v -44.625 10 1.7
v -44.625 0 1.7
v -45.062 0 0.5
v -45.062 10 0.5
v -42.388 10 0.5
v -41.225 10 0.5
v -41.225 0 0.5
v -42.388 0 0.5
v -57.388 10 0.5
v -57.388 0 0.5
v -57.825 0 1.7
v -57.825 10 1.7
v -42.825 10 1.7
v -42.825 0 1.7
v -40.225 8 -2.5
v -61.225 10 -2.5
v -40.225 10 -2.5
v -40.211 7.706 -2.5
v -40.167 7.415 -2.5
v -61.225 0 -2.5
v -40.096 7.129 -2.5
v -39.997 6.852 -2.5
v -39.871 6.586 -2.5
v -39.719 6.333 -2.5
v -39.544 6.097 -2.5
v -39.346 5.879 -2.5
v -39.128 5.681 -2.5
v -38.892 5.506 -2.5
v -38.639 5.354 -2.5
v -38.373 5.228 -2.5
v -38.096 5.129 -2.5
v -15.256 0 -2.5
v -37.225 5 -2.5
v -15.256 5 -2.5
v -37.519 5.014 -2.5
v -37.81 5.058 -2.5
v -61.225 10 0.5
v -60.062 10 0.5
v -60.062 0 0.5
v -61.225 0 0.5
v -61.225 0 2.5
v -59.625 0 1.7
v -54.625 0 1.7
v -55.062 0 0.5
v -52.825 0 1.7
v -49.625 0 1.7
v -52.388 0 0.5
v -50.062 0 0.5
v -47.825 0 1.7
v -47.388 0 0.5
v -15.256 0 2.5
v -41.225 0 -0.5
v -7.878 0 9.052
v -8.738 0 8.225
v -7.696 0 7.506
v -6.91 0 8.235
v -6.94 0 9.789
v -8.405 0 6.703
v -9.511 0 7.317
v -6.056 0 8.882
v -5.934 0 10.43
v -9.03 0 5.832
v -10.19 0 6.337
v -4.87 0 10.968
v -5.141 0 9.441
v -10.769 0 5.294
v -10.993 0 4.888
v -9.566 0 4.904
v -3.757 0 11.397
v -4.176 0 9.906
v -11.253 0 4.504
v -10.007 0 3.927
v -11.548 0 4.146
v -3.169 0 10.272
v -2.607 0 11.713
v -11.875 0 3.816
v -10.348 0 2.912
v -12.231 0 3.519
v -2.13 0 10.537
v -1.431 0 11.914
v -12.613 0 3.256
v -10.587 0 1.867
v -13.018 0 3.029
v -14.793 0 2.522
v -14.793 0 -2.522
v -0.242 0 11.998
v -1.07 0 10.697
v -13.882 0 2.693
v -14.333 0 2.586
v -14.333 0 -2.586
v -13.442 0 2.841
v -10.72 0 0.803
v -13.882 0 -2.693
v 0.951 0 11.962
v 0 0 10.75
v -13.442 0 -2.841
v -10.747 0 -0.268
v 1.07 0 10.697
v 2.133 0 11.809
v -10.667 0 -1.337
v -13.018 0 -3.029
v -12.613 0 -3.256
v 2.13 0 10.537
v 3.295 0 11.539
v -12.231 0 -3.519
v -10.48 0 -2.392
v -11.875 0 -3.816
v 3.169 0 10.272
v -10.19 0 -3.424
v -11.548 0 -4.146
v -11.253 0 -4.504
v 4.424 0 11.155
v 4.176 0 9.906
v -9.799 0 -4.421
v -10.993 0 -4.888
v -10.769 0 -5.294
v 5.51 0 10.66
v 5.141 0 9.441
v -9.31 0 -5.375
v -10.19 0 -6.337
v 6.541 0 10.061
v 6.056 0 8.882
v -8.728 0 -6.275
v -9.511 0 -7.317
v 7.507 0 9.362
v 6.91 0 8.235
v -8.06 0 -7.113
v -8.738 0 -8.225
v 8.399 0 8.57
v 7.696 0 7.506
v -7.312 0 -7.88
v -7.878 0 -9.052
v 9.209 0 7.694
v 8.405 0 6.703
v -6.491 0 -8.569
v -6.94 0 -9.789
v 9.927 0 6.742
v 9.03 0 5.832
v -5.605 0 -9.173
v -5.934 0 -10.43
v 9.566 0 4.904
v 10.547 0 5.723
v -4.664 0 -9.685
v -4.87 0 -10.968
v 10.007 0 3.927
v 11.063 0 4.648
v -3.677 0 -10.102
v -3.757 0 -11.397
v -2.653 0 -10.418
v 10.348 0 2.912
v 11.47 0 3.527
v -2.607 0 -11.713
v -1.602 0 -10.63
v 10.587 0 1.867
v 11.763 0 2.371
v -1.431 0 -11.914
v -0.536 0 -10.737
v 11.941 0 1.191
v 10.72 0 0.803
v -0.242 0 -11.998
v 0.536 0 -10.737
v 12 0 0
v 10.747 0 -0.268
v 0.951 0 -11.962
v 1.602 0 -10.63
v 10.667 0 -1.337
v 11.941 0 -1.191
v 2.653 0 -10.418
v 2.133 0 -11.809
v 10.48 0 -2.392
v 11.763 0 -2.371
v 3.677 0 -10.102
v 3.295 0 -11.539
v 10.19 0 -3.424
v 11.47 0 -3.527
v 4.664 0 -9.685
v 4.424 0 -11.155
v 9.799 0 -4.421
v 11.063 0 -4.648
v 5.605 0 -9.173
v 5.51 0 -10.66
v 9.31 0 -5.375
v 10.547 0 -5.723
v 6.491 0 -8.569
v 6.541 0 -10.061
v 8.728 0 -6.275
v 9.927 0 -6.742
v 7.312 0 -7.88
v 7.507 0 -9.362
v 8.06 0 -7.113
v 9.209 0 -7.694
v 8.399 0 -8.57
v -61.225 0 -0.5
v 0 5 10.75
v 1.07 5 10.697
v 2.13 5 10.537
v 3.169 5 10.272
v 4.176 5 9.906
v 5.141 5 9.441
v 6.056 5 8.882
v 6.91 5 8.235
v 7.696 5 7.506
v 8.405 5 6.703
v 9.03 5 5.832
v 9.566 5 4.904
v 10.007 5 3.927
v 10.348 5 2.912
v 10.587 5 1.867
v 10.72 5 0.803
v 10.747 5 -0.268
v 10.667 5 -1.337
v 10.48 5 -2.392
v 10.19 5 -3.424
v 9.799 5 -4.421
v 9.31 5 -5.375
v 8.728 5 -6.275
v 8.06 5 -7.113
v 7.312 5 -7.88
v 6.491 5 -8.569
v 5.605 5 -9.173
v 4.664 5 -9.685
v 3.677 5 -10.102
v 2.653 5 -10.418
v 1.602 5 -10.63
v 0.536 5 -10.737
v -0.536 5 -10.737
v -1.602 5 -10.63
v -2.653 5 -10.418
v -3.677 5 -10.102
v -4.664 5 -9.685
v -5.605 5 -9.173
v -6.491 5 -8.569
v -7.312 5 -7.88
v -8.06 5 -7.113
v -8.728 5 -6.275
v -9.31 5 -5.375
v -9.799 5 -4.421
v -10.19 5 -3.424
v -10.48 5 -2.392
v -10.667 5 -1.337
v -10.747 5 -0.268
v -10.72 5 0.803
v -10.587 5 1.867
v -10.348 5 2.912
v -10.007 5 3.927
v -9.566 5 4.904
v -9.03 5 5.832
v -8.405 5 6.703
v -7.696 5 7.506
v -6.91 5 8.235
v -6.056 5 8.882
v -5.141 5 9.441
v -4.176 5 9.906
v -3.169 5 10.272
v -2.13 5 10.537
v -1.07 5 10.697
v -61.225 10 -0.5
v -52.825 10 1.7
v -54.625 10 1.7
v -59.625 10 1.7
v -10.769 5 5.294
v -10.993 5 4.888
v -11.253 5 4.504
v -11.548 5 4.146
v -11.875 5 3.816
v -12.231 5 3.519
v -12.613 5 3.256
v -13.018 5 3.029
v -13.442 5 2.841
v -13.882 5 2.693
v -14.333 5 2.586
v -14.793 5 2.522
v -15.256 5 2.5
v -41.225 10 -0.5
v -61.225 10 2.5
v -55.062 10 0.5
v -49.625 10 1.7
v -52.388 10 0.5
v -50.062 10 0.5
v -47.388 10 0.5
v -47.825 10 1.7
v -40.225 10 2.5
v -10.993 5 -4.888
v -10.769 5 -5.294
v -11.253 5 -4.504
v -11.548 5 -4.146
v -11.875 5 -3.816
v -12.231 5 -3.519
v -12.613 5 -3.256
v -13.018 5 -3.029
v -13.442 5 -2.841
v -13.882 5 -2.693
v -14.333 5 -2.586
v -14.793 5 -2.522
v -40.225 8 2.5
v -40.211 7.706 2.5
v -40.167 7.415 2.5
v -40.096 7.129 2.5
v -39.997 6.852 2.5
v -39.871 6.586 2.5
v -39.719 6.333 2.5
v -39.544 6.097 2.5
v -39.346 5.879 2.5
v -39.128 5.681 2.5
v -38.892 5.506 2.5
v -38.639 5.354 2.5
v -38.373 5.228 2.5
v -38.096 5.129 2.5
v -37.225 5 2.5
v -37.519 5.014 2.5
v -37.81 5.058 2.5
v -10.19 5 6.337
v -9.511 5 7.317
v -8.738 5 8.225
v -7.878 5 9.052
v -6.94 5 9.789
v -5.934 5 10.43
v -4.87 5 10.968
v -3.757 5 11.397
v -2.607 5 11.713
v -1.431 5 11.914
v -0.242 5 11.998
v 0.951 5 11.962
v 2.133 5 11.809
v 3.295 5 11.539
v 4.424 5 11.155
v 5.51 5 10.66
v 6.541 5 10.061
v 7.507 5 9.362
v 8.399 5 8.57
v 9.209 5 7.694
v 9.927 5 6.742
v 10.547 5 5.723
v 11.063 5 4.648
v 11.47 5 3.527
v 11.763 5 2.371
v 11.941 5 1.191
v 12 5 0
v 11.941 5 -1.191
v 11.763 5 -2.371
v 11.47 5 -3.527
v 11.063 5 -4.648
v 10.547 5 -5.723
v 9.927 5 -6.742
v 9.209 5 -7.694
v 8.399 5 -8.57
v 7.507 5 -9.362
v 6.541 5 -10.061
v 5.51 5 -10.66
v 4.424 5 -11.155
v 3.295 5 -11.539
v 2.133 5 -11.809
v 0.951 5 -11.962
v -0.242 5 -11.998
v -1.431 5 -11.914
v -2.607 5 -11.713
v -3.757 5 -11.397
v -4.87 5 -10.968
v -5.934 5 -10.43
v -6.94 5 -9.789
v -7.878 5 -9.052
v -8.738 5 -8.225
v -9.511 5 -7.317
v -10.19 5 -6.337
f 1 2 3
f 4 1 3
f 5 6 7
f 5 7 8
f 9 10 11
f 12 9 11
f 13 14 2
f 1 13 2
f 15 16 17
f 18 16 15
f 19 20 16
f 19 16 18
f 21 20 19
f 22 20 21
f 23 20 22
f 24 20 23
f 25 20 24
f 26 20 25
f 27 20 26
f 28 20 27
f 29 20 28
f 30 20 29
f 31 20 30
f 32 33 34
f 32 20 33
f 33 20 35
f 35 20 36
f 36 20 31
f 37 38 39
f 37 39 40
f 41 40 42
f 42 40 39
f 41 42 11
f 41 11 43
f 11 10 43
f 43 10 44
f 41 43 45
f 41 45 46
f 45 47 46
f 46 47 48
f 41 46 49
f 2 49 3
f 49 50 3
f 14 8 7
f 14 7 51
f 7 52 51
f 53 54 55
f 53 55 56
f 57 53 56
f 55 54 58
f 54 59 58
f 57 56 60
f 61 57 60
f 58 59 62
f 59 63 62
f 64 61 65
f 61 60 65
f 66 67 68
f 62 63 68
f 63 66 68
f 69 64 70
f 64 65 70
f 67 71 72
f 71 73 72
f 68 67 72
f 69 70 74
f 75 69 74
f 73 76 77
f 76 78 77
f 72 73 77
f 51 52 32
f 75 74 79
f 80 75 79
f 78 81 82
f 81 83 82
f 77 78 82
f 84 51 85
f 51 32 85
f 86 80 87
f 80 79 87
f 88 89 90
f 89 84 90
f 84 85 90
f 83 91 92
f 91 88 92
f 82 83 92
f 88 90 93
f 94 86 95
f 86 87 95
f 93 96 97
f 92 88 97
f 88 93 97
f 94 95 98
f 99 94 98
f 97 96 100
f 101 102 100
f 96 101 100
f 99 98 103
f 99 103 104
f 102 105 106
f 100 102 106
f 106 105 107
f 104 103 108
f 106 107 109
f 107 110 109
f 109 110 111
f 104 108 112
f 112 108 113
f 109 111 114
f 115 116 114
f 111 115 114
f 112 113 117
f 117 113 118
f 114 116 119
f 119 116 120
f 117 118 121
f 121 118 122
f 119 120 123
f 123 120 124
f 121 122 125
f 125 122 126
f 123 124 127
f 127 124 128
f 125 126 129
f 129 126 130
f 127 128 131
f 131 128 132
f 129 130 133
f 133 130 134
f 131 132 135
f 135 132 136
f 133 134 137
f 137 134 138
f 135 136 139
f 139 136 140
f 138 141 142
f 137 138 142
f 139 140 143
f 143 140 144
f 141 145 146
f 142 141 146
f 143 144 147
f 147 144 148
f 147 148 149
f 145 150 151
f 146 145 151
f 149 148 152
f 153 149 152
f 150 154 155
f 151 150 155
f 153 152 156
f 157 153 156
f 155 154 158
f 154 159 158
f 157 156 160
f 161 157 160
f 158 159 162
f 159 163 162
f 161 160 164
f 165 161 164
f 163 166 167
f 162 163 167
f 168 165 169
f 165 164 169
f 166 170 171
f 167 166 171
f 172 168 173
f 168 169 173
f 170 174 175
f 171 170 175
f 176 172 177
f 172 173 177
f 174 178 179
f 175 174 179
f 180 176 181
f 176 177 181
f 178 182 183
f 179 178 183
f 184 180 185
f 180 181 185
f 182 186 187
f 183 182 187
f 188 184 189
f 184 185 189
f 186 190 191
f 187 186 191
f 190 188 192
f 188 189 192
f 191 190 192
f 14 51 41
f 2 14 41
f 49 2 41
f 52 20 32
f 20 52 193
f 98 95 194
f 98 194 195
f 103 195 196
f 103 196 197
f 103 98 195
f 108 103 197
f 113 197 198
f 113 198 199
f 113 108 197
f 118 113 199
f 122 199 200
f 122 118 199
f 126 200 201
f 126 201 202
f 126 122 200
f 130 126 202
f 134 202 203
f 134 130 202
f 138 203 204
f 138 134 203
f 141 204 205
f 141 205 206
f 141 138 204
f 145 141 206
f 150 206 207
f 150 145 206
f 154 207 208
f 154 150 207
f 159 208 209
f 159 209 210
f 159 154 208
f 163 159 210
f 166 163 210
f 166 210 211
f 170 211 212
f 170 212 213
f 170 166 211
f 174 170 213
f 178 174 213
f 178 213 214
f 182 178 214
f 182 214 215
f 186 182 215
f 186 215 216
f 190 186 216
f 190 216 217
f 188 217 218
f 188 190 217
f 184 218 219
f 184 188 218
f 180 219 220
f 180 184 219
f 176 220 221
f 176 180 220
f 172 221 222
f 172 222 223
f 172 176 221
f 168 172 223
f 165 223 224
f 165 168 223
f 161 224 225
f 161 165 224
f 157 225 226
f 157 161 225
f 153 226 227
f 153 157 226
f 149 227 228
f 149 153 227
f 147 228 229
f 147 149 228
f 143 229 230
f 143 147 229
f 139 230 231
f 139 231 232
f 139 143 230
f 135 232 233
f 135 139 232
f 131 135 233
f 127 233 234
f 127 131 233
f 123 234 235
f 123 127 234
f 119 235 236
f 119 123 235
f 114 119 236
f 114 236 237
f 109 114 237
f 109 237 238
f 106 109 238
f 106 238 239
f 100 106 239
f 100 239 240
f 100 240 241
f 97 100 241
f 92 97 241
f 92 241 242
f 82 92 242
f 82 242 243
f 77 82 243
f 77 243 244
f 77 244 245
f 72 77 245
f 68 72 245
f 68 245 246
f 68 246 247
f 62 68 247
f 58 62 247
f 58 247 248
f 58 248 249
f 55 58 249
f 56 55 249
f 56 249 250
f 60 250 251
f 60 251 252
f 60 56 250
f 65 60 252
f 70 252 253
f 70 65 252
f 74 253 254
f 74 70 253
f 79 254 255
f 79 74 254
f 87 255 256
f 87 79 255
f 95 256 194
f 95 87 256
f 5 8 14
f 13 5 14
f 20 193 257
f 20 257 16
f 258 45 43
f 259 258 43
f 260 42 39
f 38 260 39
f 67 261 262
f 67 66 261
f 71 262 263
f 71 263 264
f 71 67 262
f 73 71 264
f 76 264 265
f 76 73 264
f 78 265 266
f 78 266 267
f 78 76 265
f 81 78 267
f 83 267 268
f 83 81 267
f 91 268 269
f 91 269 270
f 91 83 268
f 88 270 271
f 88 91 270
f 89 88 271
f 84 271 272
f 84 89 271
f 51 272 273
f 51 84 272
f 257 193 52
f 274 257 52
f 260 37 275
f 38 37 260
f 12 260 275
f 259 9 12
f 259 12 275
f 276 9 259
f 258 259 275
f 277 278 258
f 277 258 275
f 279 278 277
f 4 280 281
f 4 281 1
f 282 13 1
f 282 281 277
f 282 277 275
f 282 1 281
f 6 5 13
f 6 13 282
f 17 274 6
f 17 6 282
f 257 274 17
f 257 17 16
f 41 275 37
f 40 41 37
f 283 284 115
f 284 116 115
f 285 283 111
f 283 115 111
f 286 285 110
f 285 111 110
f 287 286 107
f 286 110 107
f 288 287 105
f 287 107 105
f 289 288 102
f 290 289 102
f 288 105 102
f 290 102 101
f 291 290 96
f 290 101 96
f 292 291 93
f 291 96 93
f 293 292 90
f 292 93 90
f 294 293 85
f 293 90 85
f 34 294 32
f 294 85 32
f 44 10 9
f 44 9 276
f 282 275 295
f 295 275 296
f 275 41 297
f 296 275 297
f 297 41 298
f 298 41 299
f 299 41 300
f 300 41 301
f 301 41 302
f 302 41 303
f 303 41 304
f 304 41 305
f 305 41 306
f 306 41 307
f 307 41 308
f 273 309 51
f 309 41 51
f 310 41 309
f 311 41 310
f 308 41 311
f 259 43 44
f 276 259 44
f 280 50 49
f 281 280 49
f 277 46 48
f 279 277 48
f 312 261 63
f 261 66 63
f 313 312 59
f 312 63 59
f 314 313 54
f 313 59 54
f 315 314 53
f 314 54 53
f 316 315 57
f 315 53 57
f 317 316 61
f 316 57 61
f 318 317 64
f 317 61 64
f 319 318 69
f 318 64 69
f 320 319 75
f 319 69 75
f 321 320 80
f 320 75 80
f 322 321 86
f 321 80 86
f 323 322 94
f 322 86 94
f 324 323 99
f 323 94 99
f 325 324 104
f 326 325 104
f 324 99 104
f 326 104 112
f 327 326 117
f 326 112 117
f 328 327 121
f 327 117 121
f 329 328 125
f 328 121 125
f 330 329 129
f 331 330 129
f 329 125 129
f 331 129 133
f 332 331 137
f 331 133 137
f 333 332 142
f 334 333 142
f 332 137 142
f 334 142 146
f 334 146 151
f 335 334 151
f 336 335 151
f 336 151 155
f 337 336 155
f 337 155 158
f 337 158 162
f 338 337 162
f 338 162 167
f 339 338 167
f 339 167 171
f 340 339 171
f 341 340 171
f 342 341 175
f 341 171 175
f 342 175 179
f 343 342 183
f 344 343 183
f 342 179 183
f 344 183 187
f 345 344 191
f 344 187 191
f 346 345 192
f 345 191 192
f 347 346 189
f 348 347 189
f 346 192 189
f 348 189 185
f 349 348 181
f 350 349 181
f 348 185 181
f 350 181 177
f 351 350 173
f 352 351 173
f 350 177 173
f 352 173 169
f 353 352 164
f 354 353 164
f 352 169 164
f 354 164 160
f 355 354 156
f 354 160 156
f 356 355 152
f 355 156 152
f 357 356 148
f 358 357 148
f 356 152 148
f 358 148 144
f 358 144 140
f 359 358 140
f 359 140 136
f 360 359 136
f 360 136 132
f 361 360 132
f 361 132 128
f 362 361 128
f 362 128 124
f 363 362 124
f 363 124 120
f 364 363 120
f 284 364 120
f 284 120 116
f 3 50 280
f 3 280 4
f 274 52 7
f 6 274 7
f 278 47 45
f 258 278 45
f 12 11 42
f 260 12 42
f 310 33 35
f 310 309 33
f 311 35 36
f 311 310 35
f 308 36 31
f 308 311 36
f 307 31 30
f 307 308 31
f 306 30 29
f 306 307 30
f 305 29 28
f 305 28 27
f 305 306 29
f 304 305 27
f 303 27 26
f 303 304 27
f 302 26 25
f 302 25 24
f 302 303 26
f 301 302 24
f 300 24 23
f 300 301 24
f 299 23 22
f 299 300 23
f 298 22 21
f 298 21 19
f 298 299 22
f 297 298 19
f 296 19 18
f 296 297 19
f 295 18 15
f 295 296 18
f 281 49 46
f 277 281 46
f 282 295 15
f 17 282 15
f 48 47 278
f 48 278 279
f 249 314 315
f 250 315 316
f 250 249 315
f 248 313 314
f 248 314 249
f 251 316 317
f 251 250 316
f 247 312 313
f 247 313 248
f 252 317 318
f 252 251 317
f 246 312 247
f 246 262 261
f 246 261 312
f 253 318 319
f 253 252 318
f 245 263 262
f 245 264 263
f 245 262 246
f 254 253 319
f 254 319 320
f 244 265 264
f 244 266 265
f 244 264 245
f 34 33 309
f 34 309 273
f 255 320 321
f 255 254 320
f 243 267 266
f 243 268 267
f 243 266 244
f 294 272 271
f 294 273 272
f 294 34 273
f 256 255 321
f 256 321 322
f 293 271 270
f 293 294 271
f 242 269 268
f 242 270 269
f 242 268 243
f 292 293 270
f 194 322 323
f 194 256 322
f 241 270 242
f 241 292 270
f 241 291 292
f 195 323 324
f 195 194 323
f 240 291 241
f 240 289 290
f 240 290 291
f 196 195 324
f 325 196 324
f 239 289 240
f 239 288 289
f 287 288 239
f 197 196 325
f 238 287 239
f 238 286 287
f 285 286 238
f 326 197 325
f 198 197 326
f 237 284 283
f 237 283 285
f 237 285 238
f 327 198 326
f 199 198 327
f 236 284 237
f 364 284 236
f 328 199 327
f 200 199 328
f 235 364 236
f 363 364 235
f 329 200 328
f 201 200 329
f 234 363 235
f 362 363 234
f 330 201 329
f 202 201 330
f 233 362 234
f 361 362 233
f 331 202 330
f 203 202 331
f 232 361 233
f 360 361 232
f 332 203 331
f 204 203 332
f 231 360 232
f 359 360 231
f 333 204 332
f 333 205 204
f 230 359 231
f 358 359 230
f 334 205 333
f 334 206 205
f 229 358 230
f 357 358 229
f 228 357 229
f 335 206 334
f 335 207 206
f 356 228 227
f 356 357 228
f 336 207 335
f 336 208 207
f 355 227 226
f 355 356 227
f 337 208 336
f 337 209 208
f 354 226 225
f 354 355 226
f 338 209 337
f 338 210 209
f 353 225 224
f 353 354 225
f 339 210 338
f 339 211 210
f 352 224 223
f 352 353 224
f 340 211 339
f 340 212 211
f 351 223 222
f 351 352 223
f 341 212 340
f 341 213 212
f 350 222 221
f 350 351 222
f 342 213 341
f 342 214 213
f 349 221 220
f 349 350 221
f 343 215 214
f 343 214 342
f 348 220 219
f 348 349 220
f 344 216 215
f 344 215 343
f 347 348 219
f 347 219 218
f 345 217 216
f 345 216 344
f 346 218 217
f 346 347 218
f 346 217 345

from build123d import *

# Parameters (mm, degrees)
SKETCH_1_R               = 12
SKETCH_1_R_2             = 10.75
RING_DEPTH               = 5
SKETCH_2_W               = 50
SKETCH_2_H               = 5
STICK_DEPTH              = 5
SKETCH_3_W               = 21
SKETCH_3_H               = 5
KEY_DEPTH                = 10
FILLET_1_R               = 5
FILLET_5_R               = 3
CUT_EXTRUDE_1_DEPTH      = 63.839058045
CUT_EXTRUDE_1_DEPTH_BACK = 63.839058045


with BuildPart() as part:
    # Эскиз1 → ring (new body)
    with BuildSketch(Plane(origin=(0, 0, 0), x_dir=(1, 0, 0), z_dir=(0, 1, 0))):
        with Locations(Location((0, 0, 0), (0, 0, 270))):
            Circle(SKETCH_1_R)
        with Locations(Location((0, 0, 0), (0, 0, 270))):
            Circle(SKETCH_1_R_2, mode=Mode.SUBTRACT)
    extrude(amount=RING_DEPTH)

    # Эскиз2 → stick (add)
    with BuildSketch(Plane(origin=(0, 0, 0), x_dir=(1, 0, 0), z_dir=(0, 1, 0))):
        with Locations((-36.22497216, 0)):
            Rectangle(SKETCH_2_W, SKETCH_2_H)
    extrude(amount=STICK_DEPTH)

    # Эскиз3 → key (add)
    with BuildSketch(Plane(origin=(0, 0, 0), x_dir=(1, 0, 0), z_dir=(0, 1, 0))):
        with Locations((-50.72497216, 0)):
            Rectangle(SKETCH_3_W, SKETCH_3_H)
    extrude(amount=KEY_DEPTH)

    # Скругление1
    fillet_1_edges = [part.edges().sort_by_distance(p)[0] for p in [
        (-11.736694594, 2.5, 2.5),
        (-11.736694594, 2.5, -2.5),
    ]]
    fillet(fillet_1_edges, radius=FILLET_1_R)

    # Скругление5
    fillet_5_edges = [part.edges().sort_by_distance(p)[0] for p in [
        (-40.22497216, 5, 0),
    ]]
    fillet(fillet_5_edges, radius=FILLET_5_R)

    # Эскиз4 → Вытянуть1 (cut, two sides: drawn at the far end of the back side and taken through both)
    with BuildSketch(Plane(origin=(0, 2.5, 0), x_dir=(1, 0, 0), z_dir=(0, 1, 0)).offset(-CUT_EXTRUDE_1_DEPTH_BACK)):
        Polygon((-61.22497216, 0.5), (-41.22497216, 0.5), (-41.22497216, -0.5), (-42.388207879, -0.5), (-42.82497216, -1.7), (-44.62497216, -1.7), (-45.061736441, -0.5), (-46.22497216, -0.5), (-47.388207879, -0.5), (-47.82497216, -1.7), (-49.62497216, -1.7), (-50.061736441, -0.5), (-51.22497216, -0.5), (-52.388207879, -0.5), (-52.82497216, -1.7), (-54.62497216, -1.7), (-55.061736441, -0.5), (-56.22497216, -0.5), (-57.388207879, -0.5), (-57.82497216, -1.7), (-59.62497216, -1.7), (-60.061736441, -0.5), (-61.22497216, -0.5), align=None)
    extrude(amount=CUT_EXTRUDE_1_DEPTH + CUT_EXTRUDE_1_DEPTH_BACK, mode=Mode.SUBTRACT)


solid = part.part
